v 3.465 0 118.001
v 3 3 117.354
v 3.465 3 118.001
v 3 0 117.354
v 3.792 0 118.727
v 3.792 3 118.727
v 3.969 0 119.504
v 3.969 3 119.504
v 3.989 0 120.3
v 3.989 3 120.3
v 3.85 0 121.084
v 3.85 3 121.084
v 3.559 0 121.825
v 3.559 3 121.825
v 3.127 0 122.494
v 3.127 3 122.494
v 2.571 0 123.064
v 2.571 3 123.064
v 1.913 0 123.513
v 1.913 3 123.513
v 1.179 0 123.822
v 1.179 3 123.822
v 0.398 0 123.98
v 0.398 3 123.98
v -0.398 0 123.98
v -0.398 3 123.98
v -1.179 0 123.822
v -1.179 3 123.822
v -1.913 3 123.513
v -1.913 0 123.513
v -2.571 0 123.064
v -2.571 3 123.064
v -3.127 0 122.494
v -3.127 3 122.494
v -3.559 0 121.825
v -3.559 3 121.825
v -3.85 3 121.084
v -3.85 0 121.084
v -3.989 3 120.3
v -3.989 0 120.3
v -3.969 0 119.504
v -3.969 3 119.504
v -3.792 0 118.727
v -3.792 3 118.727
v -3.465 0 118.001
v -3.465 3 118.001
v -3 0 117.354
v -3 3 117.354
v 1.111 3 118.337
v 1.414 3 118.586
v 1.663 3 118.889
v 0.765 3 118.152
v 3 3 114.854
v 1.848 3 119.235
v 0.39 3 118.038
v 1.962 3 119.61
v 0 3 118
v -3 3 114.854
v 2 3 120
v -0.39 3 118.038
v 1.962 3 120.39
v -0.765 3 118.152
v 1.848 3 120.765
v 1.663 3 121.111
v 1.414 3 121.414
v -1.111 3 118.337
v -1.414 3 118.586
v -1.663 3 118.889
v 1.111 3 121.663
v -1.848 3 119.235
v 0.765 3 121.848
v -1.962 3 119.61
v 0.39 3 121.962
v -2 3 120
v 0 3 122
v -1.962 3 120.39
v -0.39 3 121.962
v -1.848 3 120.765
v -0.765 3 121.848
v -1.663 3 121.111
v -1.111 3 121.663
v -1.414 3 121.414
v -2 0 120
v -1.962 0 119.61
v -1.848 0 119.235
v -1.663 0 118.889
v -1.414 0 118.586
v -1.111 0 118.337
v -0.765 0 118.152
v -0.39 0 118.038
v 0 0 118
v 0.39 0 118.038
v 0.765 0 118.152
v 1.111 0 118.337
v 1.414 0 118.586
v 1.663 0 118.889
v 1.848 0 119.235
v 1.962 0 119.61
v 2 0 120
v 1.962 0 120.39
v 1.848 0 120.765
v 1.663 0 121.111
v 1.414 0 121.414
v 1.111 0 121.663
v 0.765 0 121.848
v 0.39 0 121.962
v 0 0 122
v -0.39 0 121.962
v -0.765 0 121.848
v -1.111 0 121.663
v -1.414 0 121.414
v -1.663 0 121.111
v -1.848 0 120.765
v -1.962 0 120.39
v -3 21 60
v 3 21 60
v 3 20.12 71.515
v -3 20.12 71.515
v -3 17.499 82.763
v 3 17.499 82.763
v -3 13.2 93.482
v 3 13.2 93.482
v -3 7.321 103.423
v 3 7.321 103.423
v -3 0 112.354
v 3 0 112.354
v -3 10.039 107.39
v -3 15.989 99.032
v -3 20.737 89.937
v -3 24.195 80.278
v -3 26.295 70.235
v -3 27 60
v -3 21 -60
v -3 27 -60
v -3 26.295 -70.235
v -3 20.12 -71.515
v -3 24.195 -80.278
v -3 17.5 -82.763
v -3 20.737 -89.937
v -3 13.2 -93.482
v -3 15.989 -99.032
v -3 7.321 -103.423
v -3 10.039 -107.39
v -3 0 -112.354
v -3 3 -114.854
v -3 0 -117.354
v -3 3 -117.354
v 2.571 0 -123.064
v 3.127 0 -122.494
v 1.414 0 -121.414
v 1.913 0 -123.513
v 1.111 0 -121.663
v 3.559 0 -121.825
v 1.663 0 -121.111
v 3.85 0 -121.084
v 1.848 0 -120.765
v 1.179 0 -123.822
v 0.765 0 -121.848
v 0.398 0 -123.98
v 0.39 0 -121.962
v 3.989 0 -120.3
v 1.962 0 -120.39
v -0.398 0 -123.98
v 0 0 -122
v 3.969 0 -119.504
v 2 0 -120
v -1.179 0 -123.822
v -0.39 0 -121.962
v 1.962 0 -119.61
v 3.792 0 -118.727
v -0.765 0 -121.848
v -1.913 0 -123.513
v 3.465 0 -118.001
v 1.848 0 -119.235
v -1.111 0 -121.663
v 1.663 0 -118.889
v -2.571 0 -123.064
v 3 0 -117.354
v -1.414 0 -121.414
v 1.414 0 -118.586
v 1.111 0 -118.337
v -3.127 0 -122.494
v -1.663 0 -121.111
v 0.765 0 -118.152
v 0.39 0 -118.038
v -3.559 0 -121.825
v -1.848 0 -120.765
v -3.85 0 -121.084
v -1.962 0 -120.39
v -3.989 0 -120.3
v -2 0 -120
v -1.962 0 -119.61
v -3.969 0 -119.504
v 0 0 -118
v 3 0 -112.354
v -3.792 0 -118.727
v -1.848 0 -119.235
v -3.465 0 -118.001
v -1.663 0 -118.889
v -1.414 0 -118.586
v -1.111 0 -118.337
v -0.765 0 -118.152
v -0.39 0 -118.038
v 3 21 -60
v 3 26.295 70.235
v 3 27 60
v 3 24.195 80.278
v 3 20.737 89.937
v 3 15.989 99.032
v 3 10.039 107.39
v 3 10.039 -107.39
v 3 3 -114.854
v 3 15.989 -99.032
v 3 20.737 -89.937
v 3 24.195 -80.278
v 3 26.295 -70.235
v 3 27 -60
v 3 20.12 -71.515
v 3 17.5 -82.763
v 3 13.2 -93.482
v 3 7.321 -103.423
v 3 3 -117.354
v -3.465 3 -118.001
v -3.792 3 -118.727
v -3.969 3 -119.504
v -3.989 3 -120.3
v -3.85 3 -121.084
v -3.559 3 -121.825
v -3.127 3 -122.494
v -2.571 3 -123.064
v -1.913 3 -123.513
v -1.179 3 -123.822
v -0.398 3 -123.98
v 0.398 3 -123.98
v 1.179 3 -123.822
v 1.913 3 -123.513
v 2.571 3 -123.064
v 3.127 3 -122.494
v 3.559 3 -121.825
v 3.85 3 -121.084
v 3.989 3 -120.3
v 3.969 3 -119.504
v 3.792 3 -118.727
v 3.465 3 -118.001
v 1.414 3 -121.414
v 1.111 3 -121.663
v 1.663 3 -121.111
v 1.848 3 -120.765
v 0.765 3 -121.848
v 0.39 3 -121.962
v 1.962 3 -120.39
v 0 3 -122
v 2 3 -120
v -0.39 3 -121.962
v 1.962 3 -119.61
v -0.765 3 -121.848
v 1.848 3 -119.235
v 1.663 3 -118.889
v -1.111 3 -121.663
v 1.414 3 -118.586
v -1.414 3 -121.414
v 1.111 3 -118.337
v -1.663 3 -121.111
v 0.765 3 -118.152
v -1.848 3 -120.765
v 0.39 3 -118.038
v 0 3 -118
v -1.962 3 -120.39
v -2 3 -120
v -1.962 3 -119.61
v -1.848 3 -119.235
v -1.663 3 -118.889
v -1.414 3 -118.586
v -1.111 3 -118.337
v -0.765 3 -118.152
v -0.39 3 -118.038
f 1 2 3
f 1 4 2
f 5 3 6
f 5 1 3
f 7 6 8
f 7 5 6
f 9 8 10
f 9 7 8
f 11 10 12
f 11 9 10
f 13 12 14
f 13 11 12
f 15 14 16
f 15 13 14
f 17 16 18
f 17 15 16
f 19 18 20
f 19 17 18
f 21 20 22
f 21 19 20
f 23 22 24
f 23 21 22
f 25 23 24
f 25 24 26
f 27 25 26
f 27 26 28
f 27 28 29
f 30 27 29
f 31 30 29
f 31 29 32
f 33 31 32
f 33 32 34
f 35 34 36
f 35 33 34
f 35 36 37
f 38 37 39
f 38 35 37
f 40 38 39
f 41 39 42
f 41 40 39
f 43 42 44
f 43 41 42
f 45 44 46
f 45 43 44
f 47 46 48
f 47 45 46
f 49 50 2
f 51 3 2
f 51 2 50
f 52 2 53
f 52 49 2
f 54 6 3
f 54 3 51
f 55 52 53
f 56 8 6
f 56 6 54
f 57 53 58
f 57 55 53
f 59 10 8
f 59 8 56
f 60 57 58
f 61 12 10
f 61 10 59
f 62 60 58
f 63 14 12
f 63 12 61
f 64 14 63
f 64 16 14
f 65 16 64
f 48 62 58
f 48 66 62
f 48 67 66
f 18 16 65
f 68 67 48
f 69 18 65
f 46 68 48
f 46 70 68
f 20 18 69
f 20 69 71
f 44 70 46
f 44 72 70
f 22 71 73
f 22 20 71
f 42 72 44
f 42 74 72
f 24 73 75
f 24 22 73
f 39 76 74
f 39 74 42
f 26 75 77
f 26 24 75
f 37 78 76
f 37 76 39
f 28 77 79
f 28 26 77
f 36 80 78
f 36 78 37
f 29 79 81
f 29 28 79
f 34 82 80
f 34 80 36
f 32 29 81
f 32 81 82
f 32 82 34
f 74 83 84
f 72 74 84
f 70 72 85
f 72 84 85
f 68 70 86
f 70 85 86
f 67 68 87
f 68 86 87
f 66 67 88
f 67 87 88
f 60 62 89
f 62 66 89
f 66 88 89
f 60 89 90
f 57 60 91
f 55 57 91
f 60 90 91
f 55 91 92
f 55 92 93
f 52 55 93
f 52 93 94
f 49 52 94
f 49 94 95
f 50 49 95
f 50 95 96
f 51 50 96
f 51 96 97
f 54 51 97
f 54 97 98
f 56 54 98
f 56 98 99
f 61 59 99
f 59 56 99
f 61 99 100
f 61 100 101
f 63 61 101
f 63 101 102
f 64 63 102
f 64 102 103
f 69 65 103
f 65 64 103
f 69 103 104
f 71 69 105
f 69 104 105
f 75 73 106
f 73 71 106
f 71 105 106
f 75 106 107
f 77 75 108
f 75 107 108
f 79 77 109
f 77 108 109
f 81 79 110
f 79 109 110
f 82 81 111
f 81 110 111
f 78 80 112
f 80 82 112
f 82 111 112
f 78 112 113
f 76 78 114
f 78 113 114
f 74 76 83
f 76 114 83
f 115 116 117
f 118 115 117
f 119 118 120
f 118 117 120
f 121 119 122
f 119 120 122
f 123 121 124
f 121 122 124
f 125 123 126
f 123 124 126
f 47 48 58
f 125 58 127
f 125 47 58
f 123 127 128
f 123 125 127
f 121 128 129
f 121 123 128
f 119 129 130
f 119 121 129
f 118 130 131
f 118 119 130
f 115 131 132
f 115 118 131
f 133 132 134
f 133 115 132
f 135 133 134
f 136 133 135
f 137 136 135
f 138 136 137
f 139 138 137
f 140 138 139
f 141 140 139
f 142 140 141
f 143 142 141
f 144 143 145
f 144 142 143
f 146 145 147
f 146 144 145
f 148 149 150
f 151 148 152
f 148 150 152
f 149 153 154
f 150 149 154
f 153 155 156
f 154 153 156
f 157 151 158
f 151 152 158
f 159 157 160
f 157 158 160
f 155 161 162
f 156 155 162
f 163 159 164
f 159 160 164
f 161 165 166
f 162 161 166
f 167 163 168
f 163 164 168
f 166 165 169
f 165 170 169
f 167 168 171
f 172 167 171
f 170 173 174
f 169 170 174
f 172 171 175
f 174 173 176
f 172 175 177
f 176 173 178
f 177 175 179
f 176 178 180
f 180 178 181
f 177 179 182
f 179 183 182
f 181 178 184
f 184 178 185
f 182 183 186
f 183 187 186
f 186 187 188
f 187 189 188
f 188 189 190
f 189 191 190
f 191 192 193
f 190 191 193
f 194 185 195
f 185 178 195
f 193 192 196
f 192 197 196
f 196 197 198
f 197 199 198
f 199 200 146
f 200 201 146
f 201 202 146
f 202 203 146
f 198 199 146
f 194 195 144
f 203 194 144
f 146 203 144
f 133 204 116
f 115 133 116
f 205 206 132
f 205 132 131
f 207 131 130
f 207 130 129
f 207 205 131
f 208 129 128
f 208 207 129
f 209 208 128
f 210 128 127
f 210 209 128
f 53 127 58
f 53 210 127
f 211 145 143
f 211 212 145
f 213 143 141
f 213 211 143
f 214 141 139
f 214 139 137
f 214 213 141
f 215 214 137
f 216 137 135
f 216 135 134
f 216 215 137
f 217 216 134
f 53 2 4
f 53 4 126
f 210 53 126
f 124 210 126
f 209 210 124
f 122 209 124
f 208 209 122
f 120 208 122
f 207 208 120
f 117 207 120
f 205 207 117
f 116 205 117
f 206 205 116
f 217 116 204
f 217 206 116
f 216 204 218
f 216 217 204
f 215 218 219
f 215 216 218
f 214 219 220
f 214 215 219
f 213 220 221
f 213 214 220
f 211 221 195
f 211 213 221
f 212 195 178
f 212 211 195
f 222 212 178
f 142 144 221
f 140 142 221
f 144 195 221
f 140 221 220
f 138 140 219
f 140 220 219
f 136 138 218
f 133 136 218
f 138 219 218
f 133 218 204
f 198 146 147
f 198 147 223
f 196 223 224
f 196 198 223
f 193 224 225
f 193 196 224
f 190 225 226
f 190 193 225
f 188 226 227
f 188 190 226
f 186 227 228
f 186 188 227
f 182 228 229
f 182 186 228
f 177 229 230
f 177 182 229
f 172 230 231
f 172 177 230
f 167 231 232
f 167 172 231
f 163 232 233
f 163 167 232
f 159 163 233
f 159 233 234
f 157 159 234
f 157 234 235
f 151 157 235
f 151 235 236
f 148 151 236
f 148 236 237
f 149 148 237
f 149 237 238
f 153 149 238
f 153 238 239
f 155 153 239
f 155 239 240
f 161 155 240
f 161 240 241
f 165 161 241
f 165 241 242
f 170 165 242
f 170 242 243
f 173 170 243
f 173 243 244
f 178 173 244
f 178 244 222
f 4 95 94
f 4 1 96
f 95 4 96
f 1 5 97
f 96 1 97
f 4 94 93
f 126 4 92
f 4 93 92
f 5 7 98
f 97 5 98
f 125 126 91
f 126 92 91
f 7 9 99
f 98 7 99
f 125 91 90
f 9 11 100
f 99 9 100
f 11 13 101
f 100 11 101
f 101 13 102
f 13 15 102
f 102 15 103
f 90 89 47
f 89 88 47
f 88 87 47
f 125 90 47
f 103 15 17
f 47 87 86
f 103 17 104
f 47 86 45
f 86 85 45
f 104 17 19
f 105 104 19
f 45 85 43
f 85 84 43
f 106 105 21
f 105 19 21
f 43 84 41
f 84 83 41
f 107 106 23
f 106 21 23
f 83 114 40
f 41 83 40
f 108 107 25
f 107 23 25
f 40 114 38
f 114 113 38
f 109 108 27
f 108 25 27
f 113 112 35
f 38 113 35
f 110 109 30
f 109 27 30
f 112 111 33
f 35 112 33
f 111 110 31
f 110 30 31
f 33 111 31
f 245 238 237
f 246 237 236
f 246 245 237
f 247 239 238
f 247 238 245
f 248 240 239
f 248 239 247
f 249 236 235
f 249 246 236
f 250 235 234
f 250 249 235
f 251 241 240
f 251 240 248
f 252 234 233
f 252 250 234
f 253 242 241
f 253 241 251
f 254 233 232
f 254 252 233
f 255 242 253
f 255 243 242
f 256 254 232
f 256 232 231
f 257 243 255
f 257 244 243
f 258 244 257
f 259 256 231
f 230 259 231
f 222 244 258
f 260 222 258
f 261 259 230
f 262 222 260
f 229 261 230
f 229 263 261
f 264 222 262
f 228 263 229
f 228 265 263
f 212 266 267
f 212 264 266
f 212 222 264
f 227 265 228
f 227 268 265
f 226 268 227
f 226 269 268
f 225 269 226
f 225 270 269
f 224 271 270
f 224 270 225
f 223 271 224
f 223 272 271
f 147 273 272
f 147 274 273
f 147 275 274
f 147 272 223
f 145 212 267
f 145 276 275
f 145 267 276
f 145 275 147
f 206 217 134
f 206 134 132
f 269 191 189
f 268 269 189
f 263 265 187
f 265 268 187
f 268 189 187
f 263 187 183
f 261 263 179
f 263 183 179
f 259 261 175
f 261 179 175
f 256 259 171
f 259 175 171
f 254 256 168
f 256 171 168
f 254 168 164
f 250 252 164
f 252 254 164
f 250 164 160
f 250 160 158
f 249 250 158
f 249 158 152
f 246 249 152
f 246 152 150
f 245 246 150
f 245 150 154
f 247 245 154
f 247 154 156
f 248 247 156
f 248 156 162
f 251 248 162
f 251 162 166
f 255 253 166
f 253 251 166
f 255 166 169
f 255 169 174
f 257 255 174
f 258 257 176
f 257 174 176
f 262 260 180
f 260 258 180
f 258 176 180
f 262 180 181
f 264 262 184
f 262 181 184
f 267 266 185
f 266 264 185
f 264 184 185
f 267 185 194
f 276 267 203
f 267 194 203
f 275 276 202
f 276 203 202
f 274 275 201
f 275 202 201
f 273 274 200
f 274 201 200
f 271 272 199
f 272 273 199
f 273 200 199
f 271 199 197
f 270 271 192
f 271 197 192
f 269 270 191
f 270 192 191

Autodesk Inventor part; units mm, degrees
ref_plane "YZ Plane" through (0, 0, 0) normal (1, 0, 0) x (0, 1, 0)
ref_plane "XZ Plane" through (0, 0, 0) normal (0, 1, 0) x (-1, 0, 0)
ref_plane "XY Plane" through (0, 0, 0) normal (0, 0, 1) x (1, 0, 0)
sketch "Szkic1" plane through (0, 0, 0) normal (0, 1, 0) x (-1, 0, 0)
  line L0 (0, 0) -> (0, -120)
  line L1 (0, -120) -> (0, 120)
  circle A0 centre (0, 120) radius 2
  circle A1 centre (0, -120) radius 2
  circle A2 centre (0, -120) radius 4
  circle A3 centre (0, 120) radius 4
  line L2 (-3, 117.3542) -> (3, 117.3542)
  line L3 (3, 117.3542) -> (3, -117.3542)
  line L4 (3, -117.3542) -> (-3, -117.3542)
  line L5 (-3, -117.3542) -> (-3, 117.3542)
  line L6 (3, 117.3542) -> (-3, 117.3542)
  line L7 (-3, 117.3542) -> (-3, 112.3542)
  line L8 (-3, 112.3542) -> (3, 112.3542)
  line L9 (3, 112.3542) -> (3, 117.3542)
  line L10 (3, -117.3542) -> (-3, -117.3542)
  line L11 (-3, -117.3542) -> (-3, -112.3542)
  line L12 (-3, -112.3542) -> (3, -112.3542)
  line L13 (3, -112.3542) -> (3, -117.3542)
  point P0 (-3, -117.3542)
  point P1 (3, -112.3542)
  point P2 (3, 112.3542)
  dimension "d4" = 8
  dimension "d5" = 8
  dimension "d0" = 120
  dimension "d1" = 240
  dimension "d2" = 4
  dimension "d3" = 4
  dimension "d6" = 3
  dimension "d7" = 3
  dimension "d14" = 5
  dimension "d15" = 5
extrude "Wyciągnięcie proste1" add sketch "Szkic1" along normal blind 3 contours L12 L3 A2 L0 | L0 A2 L5 L12 | L8 L5 A3 L1 | L1 A3 L3 L8 | A2 L4 L0 | L0 L4 A2 | A3 L2 L1 | L1 L2 A3 | L4 A2 | L2 A3
sketch "Szkic4" plane through (3, 0, 117.3542) normal (1, 0, 0) x (0, 0, -1)
  line L0 (0, 3) -> (5, 3) projected
  line L1 (2.5, 3) -> (232.2085, 3)
  line L2 (232.2085, 3) -> (117.3542, 3)
  line L3 (117.3542, 0) -> (117.3542, 27)
  line L4 (117.3542, 27) -> (177.3542, 27)
  line L5 (177.3542, 27) -> (57.3542, 27)
  arc A0 (57.3542, 27) -> (2.5, 3) centre (57.3542, -47.6873) ccw
  arc A1 (232.2085, 3) -> (177.3542, 27) centre (177.3542, -47.6873) ccw
  line L6 (57.3542, 27) -> (177.3542, 27)
  line L7 (177.3542, 27) -> (177.3542, 21)
  line L8 (177.3542, 21) -> (57.3542, 21)
  line L9 (57.3542, 21) -> (57.3542, 27)
  line L10 (0, 0) -> (5, 0) projected
  arc A2 (57.3542, 21) -> (5, 0) centre (57.3542, -54.7611) ccw
  line L11 (229.7085, 0) -> (229.7085, 3) projected
  arc A3 (229.7085, 0) -> (177.3542, 21) centre (177.3542, -54.7611) ccw
  line L12 (5, 0) -> (5, 3)
  point P0 (226.3787, 3)
  dimension "d26" = 27
  dimension "d27" = 60
  dimension "d28" = 120
  dimension "d29" = 6
extrude "Wyciągnięcie proste4" add sketch "Szkic4" against normal blind 6 contours A0 L9 A2 L1 L0 | L1 A2 L12 | L5 L3 L8 L9 | L4 L7 L8 L3 | A1 L1 A3 L7 | L1 L11 A3
properties part number "lacznik2"
